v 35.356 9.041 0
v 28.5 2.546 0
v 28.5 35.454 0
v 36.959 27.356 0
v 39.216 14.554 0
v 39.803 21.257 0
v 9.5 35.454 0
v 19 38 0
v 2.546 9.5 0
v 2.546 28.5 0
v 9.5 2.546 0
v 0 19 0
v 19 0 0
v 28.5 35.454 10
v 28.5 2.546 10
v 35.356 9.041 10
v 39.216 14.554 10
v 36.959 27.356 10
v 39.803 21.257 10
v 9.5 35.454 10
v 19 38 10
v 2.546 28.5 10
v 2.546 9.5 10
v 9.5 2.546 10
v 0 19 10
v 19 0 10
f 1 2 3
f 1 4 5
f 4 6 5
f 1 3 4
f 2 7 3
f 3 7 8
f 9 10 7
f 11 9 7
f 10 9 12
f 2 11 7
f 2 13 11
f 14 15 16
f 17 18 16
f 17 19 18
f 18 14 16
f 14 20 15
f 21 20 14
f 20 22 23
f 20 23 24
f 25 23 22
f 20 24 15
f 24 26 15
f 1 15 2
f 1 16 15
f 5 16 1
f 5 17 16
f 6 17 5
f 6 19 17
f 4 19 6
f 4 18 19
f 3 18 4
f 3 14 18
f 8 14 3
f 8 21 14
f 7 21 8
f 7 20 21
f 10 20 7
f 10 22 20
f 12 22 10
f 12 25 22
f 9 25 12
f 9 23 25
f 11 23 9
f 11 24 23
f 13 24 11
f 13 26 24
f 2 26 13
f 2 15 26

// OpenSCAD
$fn = 32;

// ----------------------------------------------------------------------
// Eccentric disc: egg, 10 mm thick
// ----------------------------------------------------------------------

// --- parameters (mm) ---
profile_height = 10;      // extrusion height
profile_points = 13;      // points of the closed outline

profile = [[0, 19], [2.546, 9.5], [9.5, 2.546], [19, 0], [28.5, 2.546], [35.356, 9.041], [39.216, 14.554], [39.803, 21.257], [36.959, 27.356], [28.5, 35.454], [19, 38], [9.5, 35.454], [2.546, 28.5]];  // single closed polygon, 13 points, counter clockwise

// --- the one profile operation ---
linear_extrude(height = profile_height) polygon(points = profile);
